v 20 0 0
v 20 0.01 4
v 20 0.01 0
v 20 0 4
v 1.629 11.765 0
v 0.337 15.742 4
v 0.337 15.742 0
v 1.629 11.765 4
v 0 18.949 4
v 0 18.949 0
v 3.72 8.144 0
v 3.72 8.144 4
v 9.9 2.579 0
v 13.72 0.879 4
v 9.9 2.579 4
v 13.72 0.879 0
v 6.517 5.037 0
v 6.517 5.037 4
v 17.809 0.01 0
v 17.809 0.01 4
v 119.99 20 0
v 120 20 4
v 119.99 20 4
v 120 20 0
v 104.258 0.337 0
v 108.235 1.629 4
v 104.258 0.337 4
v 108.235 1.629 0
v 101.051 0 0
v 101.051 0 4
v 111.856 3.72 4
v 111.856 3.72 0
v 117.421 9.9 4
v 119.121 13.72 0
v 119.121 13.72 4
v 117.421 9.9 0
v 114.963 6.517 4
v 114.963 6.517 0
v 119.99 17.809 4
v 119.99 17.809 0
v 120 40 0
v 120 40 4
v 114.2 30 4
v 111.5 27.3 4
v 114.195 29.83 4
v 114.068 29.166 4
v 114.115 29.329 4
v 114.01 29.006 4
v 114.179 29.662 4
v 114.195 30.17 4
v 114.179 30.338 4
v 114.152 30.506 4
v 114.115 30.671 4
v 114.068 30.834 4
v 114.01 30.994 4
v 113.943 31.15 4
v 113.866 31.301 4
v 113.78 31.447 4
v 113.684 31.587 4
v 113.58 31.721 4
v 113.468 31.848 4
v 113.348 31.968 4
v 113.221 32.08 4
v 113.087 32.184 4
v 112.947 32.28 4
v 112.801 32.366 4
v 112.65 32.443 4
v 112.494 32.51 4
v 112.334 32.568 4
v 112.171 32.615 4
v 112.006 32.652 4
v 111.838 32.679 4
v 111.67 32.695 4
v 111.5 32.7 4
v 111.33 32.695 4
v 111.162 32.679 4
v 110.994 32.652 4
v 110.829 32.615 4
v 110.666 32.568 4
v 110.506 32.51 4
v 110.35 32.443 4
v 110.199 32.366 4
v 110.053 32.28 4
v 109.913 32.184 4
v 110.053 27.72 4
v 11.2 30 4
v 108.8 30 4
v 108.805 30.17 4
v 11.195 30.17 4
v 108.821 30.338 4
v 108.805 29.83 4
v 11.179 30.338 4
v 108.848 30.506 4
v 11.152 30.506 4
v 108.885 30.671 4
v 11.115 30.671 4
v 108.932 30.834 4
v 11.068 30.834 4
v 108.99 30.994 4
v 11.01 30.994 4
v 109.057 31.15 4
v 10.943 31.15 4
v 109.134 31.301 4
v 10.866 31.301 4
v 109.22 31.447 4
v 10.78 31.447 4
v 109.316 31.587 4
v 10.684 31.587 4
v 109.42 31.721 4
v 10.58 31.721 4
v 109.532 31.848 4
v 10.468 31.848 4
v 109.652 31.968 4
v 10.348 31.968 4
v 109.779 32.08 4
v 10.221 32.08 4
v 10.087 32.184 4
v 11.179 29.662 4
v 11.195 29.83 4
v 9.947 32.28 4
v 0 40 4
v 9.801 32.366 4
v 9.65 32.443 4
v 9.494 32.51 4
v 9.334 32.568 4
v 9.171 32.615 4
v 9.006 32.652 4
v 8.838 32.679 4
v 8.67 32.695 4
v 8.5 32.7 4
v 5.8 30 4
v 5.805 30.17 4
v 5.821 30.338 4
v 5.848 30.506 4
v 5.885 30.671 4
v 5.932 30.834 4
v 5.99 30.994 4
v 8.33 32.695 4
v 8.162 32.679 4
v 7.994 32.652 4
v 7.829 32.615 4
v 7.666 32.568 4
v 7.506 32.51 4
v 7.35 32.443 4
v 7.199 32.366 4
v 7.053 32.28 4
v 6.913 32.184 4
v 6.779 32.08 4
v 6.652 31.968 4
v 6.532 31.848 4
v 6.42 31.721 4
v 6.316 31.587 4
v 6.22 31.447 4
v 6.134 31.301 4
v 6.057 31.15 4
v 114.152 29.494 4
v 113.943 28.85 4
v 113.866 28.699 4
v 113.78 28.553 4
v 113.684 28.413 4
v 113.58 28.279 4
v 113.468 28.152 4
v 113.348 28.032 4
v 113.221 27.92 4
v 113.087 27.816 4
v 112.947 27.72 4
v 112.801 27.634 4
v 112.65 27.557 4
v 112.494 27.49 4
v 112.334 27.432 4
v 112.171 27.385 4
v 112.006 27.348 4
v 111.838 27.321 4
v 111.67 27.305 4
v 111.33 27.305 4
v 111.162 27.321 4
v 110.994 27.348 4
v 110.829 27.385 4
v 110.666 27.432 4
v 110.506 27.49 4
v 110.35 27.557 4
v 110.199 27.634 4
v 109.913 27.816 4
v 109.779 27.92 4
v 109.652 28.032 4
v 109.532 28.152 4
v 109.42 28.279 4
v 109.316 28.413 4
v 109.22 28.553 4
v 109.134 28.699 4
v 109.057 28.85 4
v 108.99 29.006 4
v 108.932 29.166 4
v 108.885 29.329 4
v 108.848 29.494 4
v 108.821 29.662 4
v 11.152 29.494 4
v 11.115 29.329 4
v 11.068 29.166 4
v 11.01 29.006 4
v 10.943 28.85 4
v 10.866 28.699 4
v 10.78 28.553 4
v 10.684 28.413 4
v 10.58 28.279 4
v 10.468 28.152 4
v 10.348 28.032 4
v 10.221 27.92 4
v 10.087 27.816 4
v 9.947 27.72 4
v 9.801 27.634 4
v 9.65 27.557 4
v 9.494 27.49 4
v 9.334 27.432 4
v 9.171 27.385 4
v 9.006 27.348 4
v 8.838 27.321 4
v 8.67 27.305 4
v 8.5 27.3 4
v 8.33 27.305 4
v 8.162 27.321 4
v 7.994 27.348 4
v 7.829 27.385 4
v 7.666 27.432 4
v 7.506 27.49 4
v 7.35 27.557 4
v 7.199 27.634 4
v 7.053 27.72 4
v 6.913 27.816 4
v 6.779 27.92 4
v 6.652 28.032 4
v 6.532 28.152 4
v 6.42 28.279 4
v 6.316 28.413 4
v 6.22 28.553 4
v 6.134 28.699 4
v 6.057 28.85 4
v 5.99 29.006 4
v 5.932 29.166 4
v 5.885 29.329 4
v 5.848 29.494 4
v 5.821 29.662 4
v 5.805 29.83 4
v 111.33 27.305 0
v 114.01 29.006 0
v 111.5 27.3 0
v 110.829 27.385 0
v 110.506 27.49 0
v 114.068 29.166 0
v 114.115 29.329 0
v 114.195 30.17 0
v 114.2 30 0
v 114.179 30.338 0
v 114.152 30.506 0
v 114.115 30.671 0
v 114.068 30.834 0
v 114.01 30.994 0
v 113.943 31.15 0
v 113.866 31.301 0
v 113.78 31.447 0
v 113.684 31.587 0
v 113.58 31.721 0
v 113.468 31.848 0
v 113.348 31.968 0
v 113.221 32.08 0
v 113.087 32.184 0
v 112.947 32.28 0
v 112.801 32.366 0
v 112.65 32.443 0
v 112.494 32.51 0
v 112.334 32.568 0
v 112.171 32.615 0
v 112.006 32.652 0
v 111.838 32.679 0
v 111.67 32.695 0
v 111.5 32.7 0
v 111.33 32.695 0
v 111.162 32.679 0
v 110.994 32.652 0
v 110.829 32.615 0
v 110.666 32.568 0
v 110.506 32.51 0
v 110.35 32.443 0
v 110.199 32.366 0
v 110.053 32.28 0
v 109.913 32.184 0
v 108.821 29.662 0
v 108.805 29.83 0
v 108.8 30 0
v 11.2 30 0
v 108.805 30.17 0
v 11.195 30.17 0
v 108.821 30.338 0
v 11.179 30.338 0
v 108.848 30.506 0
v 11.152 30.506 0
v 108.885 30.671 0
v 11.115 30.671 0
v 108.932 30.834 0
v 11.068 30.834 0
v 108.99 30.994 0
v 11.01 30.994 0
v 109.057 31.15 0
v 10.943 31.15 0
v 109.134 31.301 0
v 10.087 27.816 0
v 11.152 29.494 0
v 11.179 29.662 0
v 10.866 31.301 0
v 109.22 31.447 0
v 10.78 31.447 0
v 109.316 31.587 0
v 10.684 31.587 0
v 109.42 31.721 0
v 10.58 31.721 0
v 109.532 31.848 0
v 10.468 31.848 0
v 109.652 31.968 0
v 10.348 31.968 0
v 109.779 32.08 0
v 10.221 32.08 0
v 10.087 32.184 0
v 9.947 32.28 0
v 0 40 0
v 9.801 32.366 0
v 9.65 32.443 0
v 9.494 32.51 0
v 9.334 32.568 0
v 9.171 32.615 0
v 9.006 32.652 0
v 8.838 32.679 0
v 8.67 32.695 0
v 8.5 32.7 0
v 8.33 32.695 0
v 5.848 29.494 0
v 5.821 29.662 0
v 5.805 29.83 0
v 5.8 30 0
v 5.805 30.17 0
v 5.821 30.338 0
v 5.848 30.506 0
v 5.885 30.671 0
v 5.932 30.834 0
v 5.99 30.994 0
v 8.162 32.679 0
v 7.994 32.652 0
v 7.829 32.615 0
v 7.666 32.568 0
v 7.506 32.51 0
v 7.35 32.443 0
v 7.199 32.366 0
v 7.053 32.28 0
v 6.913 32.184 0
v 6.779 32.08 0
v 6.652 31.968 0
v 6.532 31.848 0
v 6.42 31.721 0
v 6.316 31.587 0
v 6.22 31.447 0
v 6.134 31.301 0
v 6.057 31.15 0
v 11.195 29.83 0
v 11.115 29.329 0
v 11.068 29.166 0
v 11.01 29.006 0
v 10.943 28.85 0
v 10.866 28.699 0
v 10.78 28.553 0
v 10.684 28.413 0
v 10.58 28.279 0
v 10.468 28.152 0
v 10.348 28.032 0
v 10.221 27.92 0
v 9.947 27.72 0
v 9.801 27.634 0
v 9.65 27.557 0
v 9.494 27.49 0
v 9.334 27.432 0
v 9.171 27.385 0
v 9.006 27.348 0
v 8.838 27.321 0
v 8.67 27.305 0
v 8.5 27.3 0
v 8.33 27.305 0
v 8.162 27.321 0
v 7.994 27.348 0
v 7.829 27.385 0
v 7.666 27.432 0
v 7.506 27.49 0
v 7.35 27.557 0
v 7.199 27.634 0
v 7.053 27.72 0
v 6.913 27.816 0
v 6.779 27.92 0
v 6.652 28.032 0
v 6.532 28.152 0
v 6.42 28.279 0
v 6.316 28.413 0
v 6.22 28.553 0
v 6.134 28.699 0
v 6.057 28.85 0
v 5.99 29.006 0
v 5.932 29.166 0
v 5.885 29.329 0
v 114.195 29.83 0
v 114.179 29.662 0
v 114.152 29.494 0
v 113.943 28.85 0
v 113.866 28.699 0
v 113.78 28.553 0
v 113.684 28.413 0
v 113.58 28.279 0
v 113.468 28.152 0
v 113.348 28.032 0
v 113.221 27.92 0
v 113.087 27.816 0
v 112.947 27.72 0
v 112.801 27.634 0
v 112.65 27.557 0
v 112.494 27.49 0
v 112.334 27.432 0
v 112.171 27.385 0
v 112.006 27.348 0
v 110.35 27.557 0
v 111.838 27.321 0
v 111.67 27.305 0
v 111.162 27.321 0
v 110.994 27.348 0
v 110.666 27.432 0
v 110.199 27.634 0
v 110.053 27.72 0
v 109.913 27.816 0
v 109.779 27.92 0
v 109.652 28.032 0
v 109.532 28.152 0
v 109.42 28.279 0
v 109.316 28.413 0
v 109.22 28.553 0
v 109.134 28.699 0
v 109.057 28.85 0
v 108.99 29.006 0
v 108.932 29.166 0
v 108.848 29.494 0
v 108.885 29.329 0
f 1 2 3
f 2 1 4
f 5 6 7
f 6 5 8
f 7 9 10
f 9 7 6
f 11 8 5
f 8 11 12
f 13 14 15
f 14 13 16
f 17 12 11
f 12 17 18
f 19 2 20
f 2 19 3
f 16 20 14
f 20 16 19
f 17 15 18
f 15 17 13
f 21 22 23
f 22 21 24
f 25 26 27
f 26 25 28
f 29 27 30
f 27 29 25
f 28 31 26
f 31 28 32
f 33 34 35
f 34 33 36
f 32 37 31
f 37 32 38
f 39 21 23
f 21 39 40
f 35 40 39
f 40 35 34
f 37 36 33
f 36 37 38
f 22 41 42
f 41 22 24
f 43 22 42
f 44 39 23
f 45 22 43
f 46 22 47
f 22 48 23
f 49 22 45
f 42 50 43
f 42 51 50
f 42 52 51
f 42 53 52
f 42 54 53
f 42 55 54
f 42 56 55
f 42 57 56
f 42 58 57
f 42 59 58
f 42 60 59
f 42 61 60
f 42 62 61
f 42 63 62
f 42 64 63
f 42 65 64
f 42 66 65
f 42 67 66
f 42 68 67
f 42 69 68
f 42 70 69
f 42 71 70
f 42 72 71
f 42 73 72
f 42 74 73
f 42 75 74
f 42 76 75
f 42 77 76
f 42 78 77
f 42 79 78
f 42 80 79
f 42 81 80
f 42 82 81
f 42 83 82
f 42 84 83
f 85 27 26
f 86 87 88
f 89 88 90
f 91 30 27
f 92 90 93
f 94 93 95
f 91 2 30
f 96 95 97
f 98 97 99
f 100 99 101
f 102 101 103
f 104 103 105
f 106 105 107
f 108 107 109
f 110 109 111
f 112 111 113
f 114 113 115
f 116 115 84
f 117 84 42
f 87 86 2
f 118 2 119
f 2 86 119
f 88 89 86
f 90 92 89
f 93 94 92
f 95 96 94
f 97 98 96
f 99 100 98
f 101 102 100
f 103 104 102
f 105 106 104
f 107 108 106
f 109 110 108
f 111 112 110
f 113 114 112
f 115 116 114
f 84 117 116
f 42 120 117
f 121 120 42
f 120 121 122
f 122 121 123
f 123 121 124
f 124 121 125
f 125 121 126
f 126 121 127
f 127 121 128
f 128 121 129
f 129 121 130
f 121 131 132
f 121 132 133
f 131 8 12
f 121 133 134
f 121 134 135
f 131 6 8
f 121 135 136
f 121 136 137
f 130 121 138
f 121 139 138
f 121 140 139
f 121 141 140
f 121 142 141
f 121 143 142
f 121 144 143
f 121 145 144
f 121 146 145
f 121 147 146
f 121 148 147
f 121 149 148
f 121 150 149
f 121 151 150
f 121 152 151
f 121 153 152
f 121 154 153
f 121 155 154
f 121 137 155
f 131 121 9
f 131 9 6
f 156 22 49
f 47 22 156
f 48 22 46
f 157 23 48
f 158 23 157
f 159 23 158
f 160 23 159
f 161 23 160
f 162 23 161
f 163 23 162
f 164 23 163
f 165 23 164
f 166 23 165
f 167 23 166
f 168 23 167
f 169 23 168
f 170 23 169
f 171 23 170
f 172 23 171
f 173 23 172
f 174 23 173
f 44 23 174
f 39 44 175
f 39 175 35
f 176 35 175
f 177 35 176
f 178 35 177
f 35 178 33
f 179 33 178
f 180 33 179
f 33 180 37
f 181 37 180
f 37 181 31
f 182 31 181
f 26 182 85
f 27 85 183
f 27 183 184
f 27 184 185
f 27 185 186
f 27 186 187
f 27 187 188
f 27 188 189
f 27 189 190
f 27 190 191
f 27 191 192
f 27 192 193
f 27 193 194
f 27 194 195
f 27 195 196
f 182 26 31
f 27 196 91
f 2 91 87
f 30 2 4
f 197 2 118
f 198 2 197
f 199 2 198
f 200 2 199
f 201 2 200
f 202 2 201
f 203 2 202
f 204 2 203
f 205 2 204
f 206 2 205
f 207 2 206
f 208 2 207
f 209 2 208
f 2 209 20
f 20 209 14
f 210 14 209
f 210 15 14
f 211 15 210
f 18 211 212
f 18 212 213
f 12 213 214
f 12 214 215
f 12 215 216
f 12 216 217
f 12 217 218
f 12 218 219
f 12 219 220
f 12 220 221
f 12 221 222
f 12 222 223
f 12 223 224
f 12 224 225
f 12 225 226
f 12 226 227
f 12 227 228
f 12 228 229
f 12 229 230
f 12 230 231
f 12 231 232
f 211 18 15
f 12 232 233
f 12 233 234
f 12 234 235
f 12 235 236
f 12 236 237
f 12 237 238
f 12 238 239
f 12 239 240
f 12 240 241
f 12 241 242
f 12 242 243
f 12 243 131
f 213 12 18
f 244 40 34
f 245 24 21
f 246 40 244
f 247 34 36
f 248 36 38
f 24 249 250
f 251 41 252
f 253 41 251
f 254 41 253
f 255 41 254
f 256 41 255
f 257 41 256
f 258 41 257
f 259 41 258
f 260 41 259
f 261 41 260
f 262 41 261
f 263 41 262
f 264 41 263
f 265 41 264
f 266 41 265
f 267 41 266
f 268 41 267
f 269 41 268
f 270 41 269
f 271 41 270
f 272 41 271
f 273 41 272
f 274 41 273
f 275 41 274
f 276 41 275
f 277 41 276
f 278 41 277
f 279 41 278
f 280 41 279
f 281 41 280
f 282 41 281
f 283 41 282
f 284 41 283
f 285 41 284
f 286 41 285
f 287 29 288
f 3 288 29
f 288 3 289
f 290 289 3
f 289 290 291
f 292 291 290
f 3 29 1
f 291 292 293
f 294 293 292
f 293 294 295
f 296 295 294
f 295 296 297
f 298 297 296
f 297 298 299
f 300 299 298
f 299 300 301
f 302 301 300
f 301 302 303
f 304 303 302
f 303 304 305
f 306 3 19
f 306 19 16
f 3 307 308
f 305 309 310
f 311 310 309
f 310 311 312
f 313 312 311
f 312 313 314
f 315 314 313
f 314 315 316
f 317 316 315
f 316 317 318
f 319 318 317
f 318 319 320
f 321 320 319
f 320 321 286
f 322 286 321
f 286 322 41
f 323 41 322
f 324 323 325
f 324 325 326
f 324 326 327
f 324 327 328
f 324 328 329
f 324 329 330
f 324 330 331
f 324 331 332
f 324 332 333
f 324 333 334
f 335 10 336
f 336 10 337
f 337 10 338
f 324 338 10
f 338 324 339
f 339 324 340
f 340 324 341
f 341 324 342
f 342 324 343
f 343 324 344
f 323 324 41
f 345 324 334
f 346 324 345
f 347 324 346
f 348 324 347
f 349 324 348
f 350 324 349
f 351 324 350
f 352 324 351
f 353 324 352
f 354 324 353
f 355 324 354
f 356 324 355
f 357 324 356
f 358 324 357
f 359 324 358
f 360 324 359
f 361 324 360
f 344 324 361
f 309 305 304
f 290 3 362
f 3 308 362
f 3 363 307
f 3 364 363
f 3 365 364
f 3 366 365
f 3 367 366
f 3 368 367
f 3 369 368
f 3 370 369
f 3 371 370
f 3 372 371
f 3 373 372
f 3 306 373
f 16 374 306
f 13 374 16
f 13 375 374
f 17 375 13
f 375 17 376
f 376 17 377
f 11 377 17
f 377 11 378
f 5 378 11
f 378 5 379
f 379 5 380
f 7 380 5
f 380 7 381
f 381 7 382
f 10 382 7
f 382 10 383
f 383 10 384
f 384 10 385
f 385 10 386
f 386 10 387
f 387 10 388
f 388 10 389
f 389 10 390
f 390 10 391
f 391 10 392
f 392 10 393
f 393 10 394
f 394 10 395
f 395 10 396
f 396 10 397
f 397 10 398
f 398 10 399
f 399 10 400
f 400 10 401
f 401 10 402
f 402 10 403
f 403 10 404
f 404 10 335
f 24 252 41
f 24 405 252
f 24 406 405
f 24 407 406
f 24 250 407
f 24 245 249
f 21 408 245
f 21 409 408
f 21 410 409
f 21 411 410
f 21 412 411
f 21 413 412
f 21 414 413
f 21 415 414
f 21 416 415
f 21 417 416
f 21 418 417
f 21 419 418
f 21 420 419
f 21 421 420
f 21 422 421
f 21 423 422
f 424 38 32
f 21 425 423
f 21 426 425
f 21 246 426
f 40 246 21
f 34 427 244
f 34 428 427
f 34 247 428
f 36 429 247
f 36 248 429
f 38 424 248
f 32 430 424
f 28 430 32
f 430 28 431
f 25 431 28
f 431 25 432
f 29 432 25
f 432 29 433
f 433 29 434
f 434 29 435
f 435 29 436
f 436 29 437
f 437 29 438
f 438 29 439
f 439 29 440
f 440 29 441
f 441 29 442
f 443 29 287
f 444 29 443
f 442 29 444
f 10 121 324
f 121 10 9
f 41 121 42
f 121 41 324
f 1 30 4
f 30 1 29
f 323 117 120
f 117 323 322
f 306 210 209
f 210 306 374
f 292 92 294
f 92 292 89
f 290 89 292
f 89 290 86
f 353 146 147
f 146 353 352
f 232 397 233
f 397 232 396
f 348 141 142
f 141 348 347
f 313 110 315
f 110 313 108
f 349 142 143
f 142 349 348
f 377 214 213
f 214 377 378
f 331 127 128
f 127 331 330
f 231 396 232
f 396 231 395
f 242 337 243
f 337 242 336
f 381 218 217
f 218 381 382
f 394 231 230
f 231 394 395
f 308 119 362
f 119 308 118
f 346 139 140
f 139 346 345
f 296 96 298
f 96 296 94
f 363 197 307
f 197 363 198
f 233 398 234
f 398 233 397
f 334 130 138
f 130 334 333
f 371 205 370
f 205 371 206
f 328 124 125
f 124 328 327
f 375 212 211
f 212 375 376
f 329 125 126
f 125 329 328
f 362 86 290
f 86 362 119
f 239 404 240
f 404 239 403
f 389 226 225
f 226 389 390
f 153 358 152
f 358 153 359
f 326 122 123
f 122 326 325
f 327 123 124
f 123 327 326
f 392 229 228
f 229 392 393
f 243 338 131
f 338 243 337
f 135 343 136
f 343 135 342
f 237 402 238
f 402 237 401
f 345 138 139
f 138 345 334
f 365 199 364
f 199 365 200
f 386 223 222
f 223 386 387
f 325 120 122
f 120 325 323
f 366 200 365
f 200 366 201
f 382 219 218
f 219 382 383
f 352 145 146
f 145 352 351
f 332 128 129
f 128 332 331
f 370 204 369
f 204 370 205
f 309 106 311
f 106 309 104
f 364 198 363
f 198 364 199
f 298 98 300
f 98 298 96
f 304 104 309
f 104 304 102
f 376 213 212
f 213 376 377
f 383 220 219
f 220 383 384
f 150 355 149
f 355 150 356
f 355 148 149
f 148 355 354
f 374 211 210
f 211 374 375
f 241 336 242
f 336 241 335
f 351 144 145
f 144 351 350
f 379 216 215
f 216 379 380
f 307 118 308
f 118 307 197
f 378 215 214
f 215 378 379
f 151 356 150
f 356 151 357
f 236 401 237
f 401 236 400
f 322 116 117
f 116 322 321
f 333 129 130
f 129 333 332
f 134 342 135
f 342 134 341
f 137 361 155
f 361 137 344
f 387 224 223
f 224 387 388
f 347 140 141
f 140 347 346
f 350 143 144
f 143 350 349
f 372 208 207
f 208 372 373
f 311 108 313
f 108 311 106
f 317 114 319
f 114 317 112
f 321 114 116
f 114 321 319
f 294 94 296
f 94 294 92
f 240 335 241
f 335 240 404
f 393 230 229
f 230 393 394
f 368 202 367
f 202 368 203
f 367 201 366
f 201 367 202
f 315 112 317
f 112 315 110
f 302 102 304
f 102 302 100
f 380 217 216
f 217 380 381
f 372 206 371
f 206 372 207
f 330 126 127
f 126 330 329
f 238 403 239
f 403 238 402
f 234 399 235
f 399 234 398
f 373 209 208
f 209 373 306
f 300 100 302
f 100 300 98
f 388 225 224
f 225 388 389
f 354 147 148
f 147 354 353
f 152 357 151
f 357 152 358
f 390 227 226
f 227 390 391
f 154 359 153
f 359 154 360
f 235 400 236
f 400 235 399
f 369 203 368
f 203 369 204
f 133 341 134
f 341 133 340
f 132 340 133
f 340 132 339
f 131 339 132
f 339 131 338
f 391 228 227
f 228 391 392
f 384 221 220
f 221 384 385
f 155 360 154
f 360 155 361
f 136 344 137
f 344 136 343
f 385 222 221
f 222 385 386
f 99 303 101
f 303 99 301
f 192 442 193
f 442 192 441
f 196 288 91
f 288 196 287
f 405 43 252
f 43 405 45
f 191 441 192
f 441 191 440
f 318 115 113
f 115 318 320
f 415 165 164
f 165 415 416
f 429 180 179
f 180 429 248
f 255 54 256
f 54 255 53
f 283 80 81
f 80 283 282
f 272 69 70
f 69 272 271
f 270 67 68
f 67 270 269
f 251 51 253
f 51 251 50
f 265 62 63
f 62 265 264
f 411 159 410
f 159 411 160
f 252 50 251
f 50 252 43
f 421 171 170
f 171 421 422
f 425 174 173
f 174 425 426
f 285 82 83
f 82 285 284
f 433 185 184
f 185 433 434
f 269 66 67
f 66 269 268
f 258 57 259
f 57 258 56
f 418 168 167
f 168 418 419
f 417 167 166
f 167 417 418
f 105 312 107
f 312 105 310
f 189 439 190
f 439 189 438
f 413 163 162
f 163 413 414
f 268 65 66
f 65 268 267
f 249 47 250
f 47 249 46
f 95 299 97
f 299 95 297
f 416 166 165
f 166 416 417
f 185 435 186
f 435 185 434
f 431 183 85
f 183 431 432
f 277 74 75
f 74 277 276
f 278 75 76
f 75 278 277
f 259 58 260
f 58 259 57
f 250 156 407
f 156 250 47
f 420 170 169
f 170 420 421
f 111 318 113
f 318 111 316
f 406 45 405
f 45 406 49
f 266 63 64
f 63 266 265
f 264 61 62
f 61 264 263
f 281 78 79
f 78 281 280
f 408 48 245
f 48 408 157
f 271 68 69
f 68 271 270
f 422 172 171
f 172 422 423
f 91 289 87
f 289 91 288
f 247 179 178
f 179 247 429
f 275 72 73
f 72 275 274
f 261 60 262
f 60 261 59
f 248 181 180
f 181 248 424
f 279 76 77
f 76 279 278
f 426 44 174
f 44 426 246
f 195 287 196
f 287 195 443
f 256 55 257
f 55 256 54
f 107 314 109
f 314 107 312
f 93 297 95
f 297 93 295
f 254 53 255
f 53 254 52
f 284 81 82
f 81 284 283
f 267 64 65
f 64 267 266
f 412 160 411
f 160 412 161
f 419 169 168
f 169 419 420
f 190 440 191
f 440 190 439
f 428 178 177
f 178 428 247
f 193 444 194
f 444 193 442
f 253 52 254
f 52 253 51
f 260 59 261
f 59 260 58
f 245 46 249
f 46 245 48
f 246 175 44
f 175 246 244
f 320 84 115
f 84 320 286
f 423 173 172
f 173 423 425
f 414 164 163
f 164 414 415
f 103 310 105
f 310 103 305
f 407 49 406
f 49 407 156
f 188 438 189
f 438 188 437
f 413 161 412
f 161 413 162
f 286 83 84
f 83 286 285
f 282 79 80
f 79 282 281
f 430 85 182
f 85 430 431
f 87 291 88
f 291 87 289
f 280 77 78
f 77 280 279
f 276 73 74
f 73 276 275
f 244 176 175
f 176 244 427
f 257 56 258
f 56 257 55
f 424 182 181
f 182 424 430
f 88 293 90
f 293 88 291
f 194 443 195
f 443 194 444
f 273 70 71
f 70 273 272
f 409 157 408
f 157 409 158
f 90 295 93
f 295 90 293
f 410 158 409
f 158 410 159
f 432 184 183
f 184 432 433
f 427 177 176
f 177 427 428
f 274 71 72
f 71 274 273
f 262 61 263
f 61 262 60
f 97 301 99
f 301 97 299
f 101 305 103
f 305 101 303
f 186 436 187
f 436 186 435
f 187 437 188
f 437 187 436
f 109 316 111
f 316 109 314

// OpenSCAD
// file: functions.scad
/**********************************
	File: functions.scad
	Revision: 0.1 (10/7/2012)
	OpenSCAD version by:
	Michael Williams (gannon)
	mswillia@mtu.edu
**********************************/
include <config.scad>

//Drill a hole the given depth at the given location
module drill(x,y,radius,depth) {
	translate([x,y,-overdrill])
		cylinder(r=radius,h=depth,$fn=100);
}

module roundedcorner(radius,thickness,angle) {
	rotate([0,0,angle])
		translate([-radius+overdrill,-radius+overdrill,-overdrill])
			difference() {
				translate([-overdrill,-overdrill,0])
					cube([radius+overdrill,radius+overdrill,thickness+overdrill*2]);
				cylinder(r=radius,h=thickness+overdrill*2);
			}
}

//Usage: points is an array consisting of elements
//[x,y,r] for each point of the polygon
//Please note that x and y will be the centers
//of the rounded edges! Outside wall will be
//r away at some angle.
//Ideally I will make a function that will find
//the place to put the circle of a given radius
//based off of the points in the polygon.
module multiradiusroundedpoly(points,height) {
	linear_extrude(height=height)
		hull()
			for (p = points) {
				translate([p[0],p[1],0])
					circle(r=p[2],$fn=100);
			}
}
// file: config.scad
/**********************************
	File: config.scad
	Revision: 0.1 (10/7/2012)
	OpenSCAD version by:
	Michael Williams (gannon)
	mswillia@mtu.edu
**********************************/

/**********************************
		CONFIGURATION
**********************************/
//This is for the depth of holes so OpenSCAD renders correctly.
overdrill=0.1;

//Eventually group configurations into here. Maybe auto config for metric vs SAE components?

/**********************************
		END CONFIGURATION
**********************************/
// main file
/**********************************
	File: nameplate.scad
	Revision: 0.1 (10/7/2012)
	OpenSCAD version by:
	Michael Williams (gannon)
	mswillia@mtu.edu
**********************************/
include <config.scad>
use <functions.scad>
/**********************************
		CONFIGURATION
**********************************/
//Base size
length=120;
height=40;
thickness=4;

corner_radius=20;

//Holes
radius=2.7;

/**********************************
		END CONFIGURATION
**********************************/
difference() {
	cube([length,height,thickness]);
	roundedcorner(corner_radius,thickness,180);
	translate([length,0,0])
		roundedcorner(corner_radius,thickness,270);
	drill(8.5,30,radius,thickness+overdrill*2);
	drill(length-8.5,30,radius,thickness+overdrill*2);
}
